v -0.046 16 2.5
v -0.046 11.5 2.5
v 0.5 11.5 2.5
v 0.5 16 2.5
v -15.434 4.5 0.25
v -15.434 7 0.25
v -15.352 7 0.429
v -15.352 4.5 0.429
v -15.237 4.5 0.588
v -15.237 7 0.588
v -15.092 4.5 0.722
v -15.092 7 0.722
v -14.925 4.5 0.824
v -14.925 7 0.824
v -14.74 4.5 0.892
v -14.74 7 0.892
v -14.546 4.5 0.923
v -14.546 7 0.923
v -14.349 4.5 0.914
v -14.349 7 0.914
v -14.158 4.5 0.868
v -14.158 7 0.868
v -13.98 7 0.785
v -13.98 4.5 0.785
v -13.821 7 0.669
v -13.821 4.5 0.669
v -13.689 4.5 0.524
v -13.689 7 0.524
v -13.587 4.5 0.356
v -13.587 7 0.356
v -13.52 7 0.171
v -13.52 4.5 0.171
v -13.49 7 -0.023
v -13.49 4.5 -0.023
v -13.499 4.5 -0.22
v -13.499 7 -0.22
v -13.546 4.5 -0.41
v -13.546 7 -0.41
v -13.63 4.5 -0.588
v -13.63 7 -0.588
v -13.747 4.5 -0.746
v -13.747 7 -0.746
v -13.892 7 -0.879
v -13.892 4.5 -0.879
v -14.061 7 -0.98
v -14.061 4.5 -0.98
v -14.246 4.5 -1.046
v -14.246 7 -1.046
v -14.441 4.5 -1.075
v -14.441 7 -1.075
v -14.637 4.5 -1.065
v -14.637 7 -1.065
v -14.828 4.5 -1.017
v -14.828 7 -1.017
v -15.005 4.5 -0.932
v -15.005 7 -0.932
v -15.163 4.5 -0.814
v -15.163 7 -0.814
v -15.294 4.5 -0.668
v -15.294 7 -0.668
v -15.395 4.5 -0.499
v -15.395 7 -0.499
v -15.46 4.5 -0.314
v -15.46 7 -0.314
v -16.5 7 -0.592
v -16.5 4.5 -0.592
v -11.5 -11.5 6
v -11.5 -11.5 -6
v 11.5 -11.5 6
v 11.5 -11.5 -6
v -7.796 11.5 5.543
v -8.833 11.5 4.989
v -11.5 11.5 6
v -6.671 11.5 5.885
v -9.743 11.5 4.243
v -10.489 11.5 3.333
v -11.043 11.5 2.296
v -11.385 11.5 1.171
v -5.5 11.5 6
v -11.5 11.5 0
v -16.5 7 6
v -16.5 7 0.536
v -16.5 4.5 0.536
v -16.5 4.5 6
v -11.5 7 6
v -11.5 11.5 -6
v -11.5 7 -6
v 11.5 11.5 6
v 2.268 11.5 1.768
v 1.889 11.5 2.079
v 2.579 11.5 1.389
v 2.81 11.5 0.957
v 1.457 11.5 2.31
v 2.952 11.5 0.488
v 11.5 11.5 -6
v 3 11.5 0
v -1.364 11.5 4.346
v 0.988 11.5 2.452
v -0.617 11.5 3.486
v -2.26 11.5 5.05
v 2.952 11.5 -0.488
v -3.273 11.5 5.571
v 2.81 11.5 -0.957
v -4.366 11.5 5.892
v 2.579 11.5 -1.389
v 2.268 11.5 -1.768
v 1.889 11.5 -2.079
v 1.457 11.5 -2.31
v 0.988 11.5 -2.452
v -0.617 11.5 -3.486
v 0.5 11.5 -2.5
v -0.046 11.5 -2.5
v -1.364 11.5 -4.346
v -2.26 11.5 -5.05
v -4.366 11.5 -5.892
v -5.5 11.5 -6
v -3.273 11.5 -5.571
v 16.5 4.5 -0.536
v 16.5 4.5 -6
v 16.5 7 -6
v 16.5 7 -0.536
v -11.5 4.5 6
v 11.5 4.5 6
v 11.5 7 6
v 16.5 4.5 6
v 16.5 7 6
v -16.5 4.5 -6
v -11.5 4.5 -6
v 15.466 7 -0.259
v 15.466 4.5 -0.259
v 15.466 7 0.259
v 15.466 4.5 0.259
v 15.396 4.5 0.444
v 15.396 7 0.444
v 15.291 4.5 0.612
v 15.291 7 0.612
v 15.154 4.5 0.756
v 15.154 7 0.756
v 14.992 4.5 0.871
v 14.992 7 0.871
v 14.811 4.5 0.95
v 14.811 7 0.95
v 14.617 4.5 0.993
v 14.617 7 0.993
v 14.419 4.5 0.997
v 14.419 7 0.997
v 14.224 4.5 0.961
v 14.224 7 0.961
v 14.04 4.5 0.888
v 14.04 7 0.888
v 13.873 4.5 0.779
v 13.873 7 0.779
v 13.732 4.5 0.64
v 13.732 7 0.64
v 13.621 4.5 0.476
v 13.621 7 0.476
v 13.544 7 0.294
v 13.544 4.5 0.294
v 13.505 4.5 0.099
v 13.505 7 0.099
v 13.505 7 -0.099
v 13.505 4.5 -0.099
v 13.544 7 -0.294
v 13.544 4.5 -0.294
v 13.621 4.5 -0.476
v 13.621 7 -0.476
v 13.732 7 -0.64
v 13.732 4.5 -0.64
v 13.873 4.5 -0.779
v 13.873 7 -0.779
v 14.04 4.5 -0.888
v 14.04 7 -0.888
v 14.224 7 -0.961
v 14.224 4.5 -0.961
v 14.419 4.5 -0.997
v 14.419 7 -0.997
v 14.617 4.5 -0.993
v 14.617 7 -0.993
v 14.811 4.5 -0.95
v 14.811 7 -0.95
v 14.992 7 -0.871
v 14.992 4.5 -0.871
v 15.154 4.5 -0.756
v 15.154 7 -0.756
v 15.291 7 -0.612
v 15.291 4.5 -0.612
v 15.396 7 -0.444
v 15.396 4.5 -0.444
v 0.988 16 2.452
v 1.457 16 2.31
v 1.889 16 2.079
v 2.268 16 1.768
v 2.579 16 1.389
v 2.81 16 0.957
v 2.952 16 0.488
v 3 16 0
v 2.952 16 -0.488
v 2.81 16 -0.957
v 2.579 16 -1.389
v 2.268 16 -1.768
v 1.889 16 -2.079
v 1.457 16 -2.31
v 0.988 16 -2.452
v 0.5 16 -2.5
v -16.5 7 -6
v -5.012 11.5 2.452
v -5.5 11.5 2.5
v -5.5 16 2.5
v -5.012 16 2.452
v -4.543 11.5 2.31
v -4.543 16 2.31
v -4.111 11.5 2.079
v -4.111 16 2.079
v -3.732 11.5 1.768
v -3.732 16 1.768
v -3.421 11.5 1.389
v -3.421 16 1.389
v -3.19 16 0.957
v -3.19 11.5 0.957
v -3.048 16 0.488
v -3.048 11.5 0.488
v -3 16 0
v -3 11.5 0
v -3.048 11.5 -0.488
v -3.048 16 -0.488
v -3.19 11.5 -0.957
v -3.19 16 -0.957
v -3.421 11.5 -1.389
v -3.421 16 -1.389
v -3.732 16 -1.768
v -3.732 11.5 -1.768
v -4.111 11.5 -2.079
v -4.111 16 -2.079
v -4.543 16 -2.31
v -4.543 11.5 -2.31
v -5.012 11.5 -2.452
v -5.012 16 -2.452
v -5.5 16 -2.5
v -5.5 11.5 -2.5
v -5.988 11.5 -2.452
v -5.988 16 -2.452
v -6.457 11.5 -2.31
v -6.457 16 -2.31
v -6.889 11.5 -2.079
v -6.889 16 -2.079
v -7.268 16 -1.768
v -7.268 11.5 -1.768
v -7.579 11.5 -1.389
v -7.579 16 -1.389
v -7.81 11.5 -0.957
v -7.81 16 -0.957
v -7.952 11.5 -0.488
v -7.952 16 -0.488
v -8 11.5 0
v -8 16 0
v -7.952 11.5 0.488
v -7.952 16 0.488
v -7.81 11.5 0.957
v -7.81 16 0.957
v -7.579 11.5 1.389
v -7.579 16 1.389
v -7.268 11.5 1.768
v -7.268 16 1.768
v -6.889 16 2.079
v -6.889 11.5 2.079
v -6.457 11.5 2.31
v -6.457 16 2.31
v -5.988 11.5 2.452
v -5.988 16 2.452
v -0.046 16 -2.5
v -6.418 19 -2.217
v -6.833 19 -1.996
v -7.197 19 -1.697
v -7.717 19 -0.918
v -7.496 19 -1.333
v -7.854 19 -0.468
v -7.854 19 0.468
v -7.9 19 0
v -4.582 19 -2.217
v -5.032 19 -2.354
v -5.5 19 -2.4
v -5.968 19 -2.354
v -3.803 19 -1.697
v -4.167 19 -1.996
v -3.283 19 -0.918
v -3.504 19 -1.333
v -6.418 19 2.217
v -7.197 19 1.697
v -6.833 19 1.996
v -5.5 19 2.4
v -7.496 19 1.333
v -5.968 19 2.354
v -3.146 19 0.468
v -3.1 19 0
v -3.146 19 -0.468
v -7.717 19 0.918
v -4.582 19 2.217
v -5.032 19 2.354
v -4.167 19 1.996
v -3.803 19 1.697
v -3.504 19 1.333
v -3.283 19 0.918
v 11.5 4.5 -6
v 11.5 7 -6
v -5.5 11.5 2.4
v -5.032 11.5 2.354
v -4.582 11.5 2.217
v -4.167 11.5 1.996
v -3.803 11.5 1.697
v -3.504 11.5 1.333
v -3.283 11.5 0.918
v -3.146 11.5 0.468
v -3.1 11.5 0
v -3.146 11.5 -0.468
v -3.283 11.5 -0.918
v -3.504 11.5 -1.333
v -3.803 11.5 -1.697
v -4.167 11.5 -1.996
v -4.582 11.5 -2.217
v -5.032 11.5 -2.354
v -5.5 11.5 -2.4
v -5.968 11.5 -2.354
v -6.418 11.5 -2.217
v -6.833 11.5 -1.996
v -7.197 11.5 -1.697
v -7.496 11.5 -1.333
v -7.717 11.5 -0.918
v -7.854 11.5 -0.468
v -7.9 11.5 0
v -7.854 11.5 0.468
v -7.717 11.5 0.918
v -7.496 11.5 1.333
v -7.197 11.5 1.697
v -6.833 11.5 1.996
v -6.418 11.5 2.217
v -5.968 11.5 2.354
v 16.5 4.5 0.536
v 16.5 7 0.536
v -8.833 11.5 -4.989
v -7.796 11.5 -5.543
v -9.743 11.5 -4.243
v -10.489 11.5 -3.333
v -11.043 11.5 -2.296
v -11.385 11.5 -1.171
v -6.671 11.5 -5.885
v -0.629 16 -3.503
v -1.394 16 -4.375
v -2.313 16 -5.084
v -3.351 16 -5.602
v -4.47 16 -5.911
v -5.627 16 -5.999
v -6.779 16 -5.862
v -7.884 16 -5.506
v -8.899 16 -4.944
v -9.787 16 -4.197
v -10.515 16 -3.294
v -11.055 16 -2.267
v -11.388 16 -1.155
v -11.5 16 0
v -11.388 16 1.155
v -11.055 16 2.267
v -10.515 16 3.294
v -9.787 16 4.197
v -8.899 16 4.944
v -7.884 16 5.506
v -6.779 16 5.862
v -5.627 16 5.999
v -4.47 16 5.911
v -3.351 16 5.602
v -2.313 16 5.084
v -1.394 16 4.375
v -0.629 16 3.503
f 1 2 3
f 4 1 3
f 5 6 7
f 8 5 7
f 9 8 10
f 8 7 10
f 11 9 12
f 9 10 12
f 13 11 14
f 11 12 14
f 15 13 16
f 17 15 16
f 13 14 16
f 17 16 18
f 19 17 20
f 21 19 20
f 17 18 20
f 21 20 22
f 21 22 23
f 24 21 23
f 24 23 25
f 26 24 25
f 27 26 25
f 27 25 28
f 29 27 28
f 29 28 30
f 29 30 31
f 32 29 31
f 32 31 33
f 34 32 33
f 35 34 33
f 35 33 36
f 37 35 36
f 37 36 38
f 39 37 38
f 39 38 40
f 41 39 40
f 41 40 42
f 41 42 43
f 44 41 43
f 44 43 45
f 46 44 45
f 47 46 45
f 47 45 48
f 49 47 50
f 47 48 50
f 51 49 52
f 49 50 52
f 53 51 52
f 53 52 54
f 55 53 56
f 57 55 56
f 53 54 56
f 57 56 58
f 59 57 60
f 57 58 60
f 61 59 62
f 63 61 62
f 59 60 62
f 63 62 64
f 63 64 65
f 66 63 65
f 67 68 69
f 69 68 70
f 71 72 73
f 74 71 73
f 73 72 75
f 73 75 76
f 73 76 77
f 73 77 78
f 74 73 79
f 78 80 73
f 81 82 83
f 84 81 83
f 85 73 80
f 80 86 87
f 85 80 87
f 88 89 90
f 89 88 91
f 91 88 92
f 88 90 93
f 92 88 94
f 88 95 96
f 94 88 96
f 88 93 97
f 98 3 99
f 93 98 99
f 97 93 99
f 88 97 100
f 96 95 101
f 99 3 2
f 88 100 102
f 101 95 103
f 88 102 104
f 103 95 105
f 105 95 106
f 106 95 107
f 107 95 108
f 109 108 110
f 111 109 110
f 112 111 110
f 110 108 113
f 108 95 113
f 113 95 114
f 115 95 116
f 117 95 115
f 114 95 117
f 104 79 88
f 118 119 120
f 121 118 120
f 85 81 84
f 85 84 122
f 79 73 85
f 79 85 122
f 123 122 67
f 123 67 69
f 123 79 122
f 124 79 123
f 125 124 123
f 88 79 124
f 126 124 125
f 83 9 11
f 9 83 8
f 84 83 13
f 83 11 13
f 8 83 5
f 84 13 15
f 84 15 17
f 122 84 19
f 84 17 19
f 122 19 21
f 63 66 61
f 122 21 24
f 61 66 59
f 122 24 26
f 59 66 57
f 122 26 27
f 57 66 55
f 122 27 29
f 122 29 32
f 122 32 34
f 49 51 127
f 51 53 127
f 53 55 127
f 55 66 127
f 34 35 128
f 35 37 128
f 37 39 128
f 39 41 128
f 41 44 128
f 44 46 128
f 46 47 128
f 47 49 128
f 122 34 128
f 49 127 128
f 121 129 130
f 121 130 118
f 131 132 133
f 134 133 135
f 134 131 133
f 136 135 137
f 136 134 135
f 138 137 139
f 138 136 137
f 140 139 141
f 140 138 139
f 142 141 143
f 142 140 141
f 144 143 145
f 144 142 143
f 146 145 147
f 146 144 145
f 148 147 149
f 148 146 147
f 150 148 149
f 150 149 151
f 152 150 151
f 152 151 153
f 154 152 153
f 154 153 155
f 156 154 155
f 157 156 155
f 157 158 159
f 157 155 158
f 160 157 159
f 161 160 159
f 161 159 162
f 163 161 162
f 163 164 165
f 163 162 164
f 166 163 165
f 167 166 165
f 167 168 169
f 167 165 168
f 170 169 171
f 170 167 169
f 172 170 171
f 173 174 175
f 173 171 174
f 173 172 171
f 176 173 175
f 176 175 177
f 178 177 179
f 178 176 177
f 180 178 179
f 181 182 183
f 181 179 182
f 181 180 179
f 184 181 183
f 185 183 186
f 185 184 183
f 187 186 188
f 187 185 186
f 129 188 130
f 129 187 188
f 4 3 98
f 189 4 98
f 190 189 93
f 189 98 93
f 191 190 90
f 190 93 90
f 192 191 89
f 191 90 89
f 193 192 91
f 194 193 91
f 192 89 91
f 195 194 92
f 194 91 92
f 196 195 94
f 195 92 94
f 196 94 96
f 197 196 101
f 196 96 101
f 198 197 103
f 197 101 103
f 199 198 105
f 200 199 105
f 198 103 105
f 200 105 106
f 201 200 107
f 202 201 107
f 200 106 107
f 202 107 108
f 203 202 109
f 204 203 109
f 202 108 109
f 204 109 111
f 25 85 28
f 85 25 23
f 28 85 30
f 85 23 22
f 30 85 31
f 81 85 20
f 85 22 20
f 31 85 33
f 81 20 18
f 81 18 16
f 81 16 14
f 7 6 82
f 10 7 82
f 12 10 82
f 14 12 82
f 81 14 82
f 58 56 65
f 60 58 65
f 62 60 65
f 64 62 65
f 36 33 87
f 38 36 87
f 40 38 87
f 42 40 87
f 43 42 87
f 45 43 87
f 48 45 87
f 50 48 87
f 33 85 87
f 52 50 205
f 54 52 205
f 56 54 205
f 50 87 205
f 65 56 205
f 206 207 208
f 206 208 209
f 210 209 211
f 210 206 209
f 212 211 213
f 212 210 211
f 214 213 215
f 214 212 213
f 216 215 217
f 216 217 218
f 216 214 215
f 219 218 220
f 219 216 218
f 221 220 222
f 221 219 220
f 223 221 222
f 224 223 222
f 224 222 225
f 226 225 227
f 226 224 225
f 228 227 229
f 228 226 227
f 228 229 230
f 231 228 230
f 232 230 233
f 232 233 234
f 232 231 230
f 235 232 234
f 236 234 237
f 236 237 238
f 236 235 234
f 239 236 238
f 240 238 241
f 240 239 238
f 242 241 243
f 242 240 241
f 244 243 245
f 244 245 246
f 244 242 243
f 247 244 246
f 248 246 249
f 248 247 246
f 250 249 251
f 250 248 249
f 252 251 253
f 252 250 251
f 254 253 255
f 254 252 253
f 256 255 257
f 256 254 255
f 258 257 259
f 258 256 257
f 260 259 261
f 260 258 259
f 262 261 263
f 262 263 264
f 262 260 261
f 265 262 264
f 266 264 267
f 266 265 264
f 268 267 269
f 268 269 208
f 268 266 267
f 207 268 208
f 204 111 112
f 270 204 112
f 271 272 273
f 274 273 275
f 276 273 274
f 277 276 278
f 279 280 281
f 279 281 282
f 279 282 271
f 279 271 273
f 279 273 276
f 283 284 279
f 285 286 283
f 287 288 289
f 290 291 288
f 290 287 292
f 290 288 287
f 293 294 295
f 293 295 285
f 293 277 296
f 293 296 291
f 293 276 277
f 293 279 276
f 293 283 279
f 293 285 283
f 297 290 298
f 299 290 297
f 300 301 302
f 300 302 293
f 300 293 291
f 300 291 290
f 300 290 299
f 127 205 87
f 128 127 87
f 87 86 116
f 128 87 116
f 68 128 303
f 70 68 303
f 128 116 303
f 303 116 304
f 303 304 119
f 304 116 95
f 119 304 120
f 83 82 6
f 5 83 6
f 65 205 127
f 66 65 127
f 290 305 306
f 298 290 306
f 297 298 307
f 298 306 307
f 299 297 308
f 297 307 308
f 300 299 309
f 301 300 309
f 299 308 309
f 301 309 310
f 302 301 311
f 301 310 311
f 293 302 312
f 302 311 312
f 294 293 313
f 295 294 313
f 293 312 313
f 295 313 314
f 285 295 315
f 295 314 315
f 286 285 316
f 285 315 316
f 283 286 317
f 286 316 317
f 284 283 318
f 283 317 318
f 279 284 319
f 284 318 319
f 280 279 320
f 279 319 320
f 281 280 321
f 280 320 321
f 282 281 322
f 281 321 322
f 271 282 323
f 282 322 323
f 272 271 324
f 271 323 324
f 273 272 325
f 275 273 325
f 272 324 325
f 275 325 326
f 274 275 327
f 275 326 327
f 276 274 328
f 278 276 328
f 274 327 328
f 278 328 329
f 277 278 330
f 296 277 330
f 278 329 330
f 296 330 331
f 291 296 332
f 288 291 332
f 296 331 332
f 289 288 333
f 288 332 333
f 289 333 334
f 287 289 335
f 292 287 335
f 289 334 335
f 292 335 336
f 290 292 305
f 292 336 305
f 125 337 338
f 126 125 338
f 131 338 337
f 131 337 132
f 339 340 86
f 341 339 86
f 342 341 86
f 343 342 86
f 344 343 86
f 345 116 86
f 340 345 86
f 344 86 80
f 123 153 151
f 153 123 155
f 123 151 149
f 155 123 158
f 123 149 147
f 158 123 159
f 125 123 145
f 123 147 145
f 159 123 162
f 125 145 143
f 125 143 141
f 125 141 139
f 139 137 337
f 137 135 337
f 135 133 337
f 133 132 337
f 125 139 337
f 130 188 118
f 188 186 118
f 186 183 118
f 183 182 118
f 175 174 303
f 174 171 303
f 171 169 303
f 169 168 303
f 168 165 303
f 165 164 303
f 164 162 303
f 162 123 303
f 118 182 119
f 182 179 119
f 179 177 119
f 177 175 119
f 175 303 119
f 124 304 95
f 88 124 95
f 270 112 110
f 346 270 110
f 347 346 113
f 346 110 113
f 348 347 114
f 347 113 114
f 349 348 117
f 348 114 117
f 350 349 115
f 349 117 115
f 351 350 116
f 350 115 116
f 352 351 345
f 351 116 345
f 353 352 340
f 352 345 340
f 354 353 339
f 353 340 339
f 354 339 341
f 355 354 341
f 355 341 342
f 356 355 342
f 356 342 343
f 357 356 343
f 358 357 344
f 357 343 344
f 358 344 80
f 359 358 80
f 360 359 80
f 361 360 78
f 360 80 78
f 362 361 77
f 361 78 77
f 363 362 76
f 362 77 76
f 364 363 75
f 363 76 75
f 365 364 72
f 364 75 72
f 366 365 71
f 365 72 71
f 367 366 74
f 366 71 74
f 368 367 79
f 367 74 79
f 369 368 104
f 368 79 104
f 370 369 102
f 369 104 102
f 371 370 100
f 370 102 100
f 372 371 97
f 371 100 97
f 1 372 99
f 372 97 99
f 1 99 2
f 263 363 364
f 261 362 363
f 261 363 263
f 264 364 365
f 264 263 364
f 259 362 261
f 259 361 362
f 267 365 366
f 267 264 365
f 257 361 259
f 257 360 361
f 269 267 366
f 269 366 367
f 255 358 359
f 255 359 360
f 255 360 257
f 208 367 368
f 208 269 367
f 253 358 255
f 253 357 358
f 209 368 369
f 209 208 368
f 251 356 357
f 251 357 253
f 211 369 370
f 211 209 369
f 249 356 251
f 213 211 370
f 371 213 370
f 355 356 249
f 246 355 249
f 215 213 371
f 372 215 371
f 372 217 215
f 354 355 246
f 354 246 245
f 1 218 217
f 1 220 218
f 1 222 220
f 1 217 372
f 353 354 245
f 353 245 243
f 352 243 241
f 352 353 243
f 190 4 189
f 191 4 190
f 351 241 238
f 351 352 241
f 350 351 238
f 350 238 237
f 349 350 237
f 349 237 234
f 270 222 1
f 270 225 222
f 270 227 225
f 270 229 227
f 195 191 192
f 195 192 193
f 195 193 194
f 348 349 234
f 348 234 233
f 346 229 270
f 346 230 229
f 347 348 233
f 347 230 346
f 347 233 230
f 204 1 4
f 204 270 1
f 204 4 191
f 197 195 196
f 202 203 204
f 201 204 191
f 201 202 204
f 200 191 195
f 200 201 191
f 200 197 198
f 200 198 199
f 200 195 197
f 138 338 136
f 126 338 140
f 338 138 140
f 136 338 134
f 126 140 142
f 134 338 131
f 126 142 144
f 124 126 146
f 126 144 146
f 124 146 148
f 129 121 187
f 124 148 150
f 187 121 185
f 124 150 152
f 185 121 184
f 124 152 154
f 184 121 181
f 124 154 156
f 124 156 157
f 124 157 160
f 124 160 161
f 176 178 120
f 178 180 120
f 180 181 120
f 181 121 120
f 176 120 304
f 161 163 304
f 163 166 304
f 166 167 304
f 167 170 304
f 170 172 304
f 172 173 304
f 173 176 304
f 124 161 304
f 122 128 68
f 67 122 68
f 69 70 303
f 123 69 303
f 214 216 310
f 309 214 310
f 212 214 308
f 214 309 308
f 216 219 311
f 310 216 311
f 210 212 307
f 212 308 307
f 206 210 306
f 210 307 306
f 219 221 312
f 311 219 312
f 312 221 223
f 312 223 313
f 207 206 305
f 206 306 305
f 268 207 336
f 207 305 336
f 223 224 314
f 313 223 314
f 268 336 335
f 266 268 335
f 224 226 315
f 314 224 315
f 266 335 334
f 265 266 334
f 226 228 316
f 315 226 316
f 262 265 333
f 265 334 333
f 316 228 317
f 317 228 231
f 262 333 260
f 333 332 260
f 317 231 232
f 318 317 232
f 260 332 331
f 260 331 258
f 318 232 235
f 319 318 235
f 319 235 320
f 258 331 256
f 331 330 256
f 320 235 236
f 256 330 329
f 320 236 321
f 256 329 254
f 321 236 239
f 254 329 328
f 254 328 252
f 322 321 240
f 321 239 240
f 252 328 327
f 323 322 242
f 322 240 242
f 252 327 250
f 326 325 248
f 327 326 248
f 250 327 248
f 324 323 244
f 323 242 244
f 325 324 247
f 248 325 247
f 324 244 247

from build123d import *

# Parameters (mm, degrees)
SALIENTE_EXTRUIR1_DEPTH      = 6
SALIENTE_EXTRUIR1_DEPTH_BACK = 6
CROQUIS3_R                   = 2.5
SALIENTE_EXTRUIR2_DEPTH      = 4.5
CROQUIS4_R                   = 2.4
SALIENTE_EXTRUIR5_DEPTH      = 7.5
CORTAR_EXTRUIR1_DEPTH        = 3.5


with BuildPart() as part:
    # Croquis1 → Saliente-Extruir1 (new, two sides: drawn at the far end of the back side and taken through both)
    with BuildSketch(Plane.XY.offset(-SALIENTE_EXTRUIR1_DEPTH_BACK)):
        Polygon((-11.5, 7), (-16.5, 7), (-16.5, 4.5), (-11.5, 4.5), (-11.5, -11.5), (11.5, -11.5), (11.5, 4.5), (16.5, 4.5), (16.5, 7), (11.5, 7), (11.5, 11.5), (-11.5, 11.5), align=None)
    extrude(amount=SALIENTE_EXTRUIR1_DEPTH + SALIENTE_EXTRUIR1_DEPTH_BACK)

    # Croquis3 → Saliente-Extruir2 (add)
    with BuildSketch(Plane(origin=(0, 11.5, 0), x_dir=(1, 0, 0), z_dir=(0, 1, 0))):
        with BuildLine():
            Line((0.5, 2.5), (-0.045643943, 2.5))
            ThreePointArc((-0.045643943, 2.5), (-11.5, 0), (-0.045643943, -2.5))
            Line((-0.045643943, -2.5), (0.5, -2.5))
            ThreePointArc((0.5, -2.5), (3, 0), (0.5, 2.5))
        make_face()
        with Locations((-5.5, 0)):
            Circle(CROQUIS3_R, mode=Mode.SUBTRACT)
    extrude(amount=SALIENTE_EXTRUIR2_DEPTH)

    # Croquis4 → Saliente-Extruir5 (add)
    with BuildSketch(Plane(origin=(0, 11.5, 0), x_dir=(1, 0, 0), z_dir=(0, 1, 0))):
        with Locations((-5.5, 0)):
            Circle(CROQUIS4_R)
    extrude(amount=SALIENTE_EXTRUIR5_DEPTH)

    # Croquis6 → Cortar-Extruir1 (cut)
    with BuildSketch(Plane(origin=(0, 7, 0), x_dir=(1, 0, 0), z_dir=(0, 1, 0))):
        with BuildLine():
            Line((-16.5, 0.59249524), (-16.5, -0.535898385))
            Line((-16.5, -0.535898385), (-15.434038365, -0.250274826))
            ThreePointArc((-15.434038365, -0.250274826), (-13.489741501, 0.12166281), (-15.45994605, 0.313813624))
            Line((-15.45994605, 0.313813624), (-16.5, 0.59249524))
        make_face()
        with BuildLine():
            Line((15.465925826, 0.258819045), (16.5, 0.535898385))
            Line((16.5, 0.535898385), (16.5, -0.535898385))
            Line((16.5, -0.535898385), (15.465925826, -0.258819045))
            ThreePointArc((15.465925826, -0.258819045), (13.5, 0), (15.465925826, 0.258819045))
        make_face()
    extrude(amount=-CORTAR_EXTRUIR1_DEPTH, mode=Mode.SUBTRACT)


solid = part.part
